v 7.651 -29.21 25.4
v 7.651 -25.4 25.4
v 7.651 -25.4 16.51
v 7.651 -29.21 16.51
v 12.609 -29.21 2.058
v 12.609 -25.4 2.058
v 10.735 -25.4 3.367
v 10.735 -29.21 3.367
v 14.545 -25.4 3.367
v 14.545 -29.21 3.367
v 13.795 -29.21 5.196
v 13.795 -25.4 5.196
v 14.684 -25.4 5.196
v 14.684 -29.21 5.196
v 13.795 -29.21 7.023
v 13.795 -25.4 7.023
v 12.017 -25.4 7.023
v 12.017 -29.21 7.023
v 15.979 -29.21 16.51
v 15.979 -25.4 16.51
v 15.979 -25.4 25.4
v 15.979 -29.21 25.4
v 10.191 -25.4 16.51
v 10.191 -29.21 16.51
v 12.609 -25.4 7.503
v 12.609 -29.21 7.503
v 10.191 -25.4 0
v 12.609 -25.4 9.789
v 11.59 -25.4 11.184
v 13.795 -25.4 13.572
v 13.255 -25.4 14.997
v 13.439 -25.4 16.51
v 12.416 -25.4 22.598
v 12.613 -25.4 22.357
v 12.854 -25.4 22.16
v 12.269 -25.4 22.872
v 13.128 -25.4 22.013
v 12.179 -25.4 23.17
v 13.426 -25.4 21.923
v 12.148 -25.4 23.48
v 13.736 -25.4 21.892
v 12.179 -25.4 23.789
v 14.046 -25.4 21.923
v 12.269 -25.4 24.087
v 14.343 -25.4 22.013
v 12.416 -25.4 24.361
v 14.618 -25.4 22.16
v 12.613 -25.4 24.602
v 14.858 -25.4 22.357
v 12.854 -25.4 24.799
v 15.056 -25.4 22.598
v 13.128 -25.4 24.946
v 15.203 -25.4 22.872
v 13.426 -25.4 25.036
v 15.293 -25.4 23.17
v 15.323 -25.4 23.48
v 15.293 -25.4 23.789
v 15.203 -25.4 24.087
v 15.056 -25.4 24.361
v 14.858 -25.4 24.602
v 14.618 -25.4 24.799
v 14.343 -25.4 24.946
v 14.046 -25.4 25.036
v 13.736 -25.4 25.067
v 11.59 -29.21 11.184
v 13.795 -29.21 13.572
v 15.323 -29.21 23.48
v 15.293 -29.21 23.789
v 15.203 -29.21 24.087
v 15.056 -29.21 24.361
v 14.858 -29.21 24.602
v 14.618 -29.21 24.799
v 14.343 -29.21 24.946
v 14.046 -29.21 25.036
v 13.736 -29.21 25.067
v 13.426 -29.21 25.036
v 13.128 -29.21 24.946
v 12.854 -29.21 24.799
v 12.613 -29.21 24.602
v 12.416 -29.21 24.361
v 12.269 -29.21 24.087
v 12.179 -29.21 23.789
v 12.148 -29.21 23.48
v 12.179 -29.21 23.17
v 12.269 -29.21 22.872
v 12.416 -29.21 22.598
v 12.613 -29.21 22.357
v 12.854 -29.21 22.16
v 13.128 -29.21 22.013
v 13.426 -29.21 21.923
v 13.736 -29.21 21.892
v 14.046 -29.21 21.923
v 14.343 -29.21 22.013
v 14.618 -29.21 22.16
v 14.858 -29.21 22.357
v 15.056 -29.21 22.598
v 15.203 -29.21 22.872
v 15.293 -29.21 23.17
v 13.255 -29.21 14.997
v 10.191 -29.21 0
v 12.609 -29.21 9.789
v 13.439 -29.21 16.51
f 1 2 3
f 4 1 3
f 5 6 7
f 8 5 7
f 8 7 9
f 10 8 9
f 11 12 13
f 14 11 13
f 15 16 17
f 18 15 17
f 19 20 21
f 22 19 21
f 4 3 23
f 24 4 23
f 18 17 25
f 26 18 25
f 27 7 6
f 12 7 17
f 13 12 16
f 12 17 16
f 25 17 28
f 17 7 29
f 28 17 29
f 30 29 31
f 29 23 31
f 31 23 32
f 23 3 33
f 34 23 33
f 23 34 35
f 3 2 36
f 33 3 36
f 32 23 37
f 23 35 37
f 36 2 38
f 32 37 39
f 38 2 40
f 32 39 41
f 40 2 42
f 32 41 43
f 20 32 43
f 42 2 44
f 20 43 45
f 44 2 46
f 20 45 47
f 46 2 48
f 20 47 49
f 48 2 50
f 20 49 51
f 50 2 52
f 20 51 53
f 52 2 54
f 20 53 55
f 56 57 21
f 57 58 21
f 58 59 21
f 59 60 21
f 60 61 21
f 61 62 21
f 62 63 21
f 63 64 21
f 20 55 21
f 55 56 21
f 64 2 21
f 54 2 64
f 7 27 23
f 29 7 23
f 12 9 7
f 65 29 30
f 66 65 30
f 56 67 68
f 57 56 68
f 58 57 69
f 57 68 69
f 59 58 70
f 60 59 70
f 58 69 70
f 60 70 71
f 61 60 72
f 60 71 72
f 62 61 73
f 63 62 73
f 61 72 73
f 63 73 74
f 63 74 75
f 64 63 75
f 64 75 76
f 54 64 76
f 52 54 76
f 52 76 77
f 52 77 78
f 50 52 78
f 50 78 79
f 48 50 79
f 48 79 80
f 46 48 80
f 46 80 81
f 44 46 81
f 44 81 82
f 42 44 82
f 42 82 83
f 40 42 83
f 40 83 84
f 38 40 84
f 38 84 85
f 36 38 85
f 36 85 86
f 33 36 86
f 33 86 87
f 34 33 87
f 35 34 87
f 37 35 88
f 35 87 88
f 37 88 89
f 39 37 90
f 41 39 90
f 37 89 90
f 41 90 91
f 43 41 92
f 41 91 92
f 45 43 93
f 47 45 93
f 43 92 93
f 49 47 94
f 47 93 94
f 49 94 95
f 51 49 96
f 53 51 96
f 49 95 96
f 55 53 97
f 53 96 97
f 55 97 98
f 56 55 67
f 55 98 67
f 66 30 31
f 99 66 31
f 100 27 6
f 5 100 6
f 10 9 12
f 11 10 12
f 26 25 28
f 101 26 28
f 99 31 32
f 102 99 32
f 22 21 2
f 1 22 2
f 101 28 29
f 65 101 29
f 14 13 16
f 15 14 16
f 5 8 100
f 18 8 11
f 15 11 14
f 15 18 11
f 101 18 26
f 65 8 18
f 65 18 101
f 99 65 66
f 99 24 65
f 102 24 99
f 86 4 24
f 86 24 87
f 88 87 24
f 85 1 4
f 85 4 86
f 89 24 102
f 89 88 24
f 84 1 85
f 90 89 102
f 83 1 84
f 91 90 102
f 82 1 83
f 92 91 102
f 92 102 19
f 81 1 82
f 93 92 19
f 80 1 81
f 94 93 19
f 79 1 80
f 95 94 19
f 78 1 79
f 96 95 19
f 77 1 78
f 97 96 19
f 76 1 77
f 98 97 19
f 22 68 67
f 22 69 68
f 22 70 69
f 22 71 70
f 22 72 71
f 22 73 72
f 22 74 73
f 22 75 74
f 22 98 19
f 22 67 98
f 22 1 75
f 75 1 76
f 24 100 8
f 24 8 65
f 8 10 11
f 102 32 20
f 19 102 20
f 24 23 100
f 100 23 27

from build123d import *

# Parameters (mm, degrees)
F5_DEPTH = 3.81
F6_R     = 1.5875
F7_DEPTH = 25.4


# Not quite as in the source:
# - a feature of the source that left no trace in its solid (it failed there, or was rolled back) is left out


with BuildPart() as f5:
    # F3 (on offset) → F5 (new body)
    with BuildSketch(Plane.XZ.offset(25.4)):
        Polygon((15.9794489164, 25.4), (7.6507270483, 25.4), (7.6507270483, 16.51), (10.1907270483, 16.51), (10.1907270483, 0), (12.6087698864, 2.0575941857), (10.7351641334, 3.3673260217), (14.5451641334, 3.3673260217), (13.7953708033, 5.1956650805), (14.6843708033, 5.1956650805), (13.7953708033, 7.0228768909), (12.0173708033, 7.0228768909), (12.6087698864, 7.5033882066), (12.6087698864, 9.7893882066), (11.5895427104, 11.1838041431), (13.7953708033, 13.5722395859), (13.2549618376, 14.9972077083), (13.4394489164, 16.51), (15.9794489164, 16.51), align=None)
    extrude(amount=F5_DEPTH)

    # F6 (on face) → F7 (cut)
    with BuildSketch(Plane.XZ.offset(29.21)):
        with Locations((13.7358959764, 23.4795026481)):
            Circle(F6_R)
    extrude(amount=-F7_DEPTH, mode=Mode.SUBTRACT)


solid = f5.part
